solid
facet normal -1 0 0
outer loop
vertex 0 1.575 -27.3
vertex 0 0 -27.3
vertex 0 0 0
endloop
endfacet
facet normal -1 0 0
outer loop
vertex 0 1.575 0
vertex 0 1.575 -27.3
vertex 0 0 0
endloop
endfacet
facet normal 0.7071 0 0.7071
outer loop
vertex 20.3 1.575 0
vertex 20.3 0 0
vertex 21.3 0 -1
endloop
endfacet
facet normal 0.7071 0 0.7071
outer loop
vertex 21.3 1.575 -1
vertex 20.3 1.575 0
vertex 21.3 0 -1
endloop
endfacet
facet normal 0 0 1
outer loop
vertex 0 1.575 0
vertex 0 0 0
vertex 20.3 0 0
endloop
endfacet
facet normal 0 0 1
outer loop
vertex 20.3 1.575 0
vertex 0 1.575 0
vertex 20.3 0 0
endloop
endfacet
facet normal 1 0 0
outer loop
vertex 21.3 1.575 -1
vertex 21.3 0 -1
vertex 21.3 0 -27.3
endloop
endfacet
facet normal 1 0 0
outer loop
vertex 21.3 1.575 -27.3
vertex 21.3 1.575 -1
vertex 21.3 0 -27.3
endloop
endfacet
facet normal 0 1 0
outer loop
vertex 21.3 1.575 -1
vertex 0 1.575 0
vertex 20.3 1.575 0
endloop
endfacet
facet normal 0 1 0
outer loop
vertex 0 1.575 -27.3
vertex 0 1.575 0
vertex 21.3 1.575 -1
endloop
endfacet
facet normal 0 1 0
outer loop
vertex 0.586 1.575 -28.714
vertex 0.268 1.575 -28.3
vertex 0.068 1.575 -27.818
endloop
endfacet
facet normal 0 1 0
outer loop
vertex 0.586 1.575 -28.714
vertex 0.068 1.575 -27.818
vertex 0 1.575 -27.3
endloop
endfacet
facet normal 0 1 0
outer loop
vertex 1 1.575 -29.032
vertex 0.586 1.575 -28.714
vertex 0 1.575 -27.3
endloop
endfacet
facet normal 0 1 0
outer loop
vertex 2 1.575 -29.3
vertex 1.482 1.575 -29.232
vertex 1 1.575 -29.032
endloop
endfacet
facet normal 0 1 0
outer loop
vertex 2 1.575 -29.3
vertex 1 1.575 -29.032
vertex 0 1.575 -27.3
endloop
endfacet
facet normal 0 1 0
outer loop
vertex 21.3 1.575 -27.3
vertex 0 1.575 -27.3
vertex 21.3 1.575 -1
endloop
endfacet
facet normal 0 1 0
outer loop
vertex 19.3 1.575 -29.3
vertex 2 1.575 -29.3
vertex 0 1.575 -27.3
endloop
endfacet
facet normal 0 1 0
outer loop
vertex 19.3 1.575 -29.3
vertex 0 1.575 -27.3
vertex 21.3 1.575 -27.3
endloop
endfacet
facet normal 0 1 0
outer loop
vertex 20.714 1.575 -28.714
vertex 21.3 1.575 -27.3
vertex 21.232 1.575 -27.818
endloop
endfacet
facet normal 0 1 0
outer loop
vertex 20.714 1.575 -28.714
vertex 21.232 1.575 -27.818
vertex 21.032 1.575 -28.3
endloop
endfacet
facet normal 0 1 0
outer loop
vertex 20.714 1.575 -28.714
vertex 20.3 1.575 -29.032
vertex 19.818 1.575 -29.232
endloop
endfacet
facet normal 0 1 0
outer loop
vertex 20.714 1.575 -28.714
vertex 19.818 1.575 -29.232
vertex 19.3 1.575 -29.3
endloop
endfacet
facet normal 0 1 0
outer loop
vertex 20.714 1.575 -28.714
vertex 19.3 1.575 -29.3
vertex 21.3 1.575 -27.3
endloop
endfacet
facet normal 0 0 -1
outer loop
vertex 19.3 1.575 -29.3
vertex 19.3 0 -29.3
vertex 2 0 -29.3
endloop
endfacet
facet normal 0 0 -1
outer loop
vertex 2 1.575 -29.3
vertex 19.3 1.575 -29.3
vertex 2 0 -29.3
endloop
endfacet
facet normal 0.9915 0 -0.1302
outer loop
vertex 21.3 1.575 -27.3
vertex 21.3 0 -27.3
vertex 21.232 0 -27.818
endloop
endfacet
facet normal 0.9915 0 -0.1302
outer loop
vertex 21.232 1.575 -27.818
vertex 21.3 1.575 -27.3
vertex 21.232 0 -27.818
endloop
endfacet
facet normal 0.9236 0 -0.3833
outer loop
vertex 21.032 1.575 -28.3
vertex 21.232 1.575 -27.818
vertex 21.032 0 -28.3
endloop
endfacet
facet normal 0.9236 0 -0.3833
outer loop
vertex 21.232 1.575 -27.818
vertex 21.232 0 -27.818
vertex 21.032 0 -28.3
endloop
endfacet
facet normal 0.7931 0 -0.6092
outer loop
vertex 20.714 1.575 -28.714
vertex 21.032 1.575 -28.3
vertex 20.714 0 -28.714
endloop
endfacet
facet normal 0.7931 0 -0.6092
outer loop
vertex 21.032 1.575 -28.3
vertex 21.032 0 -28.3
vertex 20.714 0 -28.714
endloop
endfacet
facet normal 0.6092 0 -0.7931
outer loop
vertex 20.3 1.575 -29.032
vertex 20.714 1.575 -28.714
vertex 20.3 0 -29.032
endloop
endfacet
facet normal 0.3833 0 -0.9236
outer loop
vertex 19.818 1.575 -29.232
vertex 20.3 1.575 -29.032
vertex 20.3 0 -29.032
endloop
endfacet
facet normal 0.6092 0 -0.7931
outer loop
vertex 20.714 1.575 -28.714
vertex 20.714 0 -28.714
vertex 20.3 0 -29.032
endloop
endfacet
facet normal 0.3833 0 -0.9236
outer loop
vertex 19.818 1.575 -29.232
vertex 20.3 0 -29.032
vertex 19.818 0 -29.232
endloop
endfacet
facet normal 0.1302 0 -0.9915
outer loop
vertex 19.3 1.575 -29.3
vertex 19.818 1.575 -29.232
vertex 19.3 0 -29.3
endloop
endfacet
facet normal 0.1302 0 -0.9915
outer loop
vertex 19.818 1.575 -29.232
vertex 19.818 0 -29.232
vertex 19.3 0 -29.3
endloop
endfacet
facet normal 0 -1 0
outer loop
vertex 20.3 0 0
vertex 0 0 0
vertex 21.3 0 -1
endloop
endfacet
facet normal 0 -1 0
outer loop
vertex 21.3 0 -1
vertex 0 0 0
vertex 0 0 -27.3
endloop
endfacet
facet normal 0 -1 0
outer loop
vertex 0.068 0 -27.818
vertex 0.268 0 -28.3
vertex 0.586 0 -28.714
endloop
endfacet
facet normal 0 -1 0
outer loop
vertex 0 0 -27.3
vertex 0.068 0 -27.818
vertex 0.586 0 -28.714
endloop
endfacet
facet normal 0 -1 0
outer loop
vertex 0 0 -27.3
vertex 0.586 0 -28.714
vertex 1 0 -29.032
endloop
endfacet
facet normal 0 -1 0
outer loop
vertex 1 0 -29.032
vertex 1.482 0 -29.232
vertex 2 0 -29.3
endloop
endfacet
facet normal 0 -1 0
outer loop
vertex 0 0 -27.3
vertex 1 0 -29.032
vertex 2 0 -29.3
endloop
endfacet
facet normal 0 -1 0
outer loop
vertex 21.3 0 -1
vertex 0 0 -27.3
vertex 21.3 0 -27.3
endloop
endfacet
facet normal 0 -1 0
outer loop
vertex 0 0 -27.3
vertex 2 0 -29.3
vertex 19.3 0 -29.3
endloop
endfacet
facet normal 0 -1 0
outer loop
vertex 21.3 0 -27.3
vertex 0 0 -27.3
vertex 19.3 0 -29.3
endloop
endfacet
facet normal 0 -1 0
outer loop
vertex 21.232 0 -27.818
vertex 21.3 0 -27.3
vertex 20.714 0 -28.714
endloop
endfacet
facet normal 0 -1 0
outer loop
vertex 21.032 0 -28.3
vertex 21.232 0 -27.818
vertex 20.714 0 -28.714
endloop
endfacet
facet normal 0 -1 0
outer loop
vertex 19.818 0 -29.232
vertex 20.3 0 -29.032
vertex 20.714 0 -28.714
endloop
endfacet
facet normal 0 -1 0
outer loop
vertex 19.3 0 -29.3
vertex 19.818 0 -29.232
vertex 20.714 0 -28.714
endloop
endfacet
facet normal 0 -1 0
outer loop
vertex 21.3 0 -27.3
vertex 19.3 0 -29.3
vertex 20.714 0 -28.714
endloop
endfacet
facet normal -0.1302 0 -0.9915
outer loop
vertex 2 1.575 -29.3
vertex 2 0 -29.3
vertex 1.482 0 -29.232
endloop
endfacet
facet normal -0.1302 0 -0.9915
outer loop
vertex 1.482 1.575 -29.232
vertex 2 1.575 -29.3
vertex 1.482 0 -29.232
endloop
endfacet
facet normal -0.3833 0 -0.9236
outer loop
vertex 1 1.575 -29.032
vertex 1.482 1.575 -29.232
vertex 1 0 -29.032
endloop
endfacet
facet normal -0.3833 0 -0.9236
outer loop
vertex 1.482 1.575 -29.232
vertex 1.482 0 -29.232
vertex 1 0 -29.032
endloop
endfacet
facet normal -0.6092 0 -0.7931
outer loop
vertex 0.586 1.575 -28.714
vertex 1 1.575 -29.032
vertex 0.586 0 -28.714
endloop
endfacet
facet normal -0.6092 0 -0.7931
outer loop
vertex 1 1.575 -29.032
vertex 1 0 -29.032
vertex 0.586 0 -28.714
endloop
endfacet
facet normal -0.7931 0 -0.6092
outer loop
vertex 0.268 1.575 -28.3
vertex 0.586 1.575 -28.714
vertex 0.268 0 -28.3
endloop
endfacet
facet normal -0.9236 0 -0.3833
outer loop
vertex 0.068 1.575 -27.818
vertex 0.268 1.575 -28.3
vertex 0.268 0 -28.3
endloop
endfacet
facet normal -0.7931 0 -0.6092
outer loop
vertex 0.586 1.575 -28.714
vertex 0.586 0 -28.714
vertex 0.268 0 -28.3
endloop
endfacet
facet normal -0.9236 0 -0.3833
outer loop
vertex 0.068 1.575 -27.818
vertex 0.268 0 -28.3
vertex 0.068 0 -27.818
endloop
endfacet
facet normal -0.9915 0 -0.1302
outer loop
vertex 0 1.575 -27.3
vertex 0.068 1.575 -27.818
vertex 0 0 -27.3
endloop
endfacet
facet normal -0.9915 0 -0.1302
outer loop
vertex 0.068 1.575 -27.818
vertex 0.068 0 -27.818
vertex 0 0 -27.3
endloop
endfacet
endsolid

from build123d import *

# Parameters (mm, degrees)
BOSS_EXTRUDE2_DEPTH = 1.575


with BuildPart() as part:
    # Sketch2 → Boss-Extrude2 (new body)
    with BuildSketch(Plane(origin=(0, 0, 0), x_dir=(1, 0, 0), z_dir=(0, 1, 0))):
        with BuildLine():
            Line((0, 2), (0, 0))
            Line((0, 0), (2, 0))
            Line((2, 0), (20.3, 0))
            Line((20.3, 0), (21.3, 1))
            Line((21.3, 1), (21.3, 27.3))
            ThreePointArc((21.3, 27.3), (20.714213562, 28.714213562), (19.3, 29.3))
            Line((19.3, 29.3), (2, 29.3))
            ThreePointArc((2, 29.3), (0.585786438, 28.714213562), (0, 27.3))
            Line((0, 27.3), (0, 2))
        make_face()
    extrude(amount=BOSS_EXTRUDE2_DEPTH)


solid = part.part
